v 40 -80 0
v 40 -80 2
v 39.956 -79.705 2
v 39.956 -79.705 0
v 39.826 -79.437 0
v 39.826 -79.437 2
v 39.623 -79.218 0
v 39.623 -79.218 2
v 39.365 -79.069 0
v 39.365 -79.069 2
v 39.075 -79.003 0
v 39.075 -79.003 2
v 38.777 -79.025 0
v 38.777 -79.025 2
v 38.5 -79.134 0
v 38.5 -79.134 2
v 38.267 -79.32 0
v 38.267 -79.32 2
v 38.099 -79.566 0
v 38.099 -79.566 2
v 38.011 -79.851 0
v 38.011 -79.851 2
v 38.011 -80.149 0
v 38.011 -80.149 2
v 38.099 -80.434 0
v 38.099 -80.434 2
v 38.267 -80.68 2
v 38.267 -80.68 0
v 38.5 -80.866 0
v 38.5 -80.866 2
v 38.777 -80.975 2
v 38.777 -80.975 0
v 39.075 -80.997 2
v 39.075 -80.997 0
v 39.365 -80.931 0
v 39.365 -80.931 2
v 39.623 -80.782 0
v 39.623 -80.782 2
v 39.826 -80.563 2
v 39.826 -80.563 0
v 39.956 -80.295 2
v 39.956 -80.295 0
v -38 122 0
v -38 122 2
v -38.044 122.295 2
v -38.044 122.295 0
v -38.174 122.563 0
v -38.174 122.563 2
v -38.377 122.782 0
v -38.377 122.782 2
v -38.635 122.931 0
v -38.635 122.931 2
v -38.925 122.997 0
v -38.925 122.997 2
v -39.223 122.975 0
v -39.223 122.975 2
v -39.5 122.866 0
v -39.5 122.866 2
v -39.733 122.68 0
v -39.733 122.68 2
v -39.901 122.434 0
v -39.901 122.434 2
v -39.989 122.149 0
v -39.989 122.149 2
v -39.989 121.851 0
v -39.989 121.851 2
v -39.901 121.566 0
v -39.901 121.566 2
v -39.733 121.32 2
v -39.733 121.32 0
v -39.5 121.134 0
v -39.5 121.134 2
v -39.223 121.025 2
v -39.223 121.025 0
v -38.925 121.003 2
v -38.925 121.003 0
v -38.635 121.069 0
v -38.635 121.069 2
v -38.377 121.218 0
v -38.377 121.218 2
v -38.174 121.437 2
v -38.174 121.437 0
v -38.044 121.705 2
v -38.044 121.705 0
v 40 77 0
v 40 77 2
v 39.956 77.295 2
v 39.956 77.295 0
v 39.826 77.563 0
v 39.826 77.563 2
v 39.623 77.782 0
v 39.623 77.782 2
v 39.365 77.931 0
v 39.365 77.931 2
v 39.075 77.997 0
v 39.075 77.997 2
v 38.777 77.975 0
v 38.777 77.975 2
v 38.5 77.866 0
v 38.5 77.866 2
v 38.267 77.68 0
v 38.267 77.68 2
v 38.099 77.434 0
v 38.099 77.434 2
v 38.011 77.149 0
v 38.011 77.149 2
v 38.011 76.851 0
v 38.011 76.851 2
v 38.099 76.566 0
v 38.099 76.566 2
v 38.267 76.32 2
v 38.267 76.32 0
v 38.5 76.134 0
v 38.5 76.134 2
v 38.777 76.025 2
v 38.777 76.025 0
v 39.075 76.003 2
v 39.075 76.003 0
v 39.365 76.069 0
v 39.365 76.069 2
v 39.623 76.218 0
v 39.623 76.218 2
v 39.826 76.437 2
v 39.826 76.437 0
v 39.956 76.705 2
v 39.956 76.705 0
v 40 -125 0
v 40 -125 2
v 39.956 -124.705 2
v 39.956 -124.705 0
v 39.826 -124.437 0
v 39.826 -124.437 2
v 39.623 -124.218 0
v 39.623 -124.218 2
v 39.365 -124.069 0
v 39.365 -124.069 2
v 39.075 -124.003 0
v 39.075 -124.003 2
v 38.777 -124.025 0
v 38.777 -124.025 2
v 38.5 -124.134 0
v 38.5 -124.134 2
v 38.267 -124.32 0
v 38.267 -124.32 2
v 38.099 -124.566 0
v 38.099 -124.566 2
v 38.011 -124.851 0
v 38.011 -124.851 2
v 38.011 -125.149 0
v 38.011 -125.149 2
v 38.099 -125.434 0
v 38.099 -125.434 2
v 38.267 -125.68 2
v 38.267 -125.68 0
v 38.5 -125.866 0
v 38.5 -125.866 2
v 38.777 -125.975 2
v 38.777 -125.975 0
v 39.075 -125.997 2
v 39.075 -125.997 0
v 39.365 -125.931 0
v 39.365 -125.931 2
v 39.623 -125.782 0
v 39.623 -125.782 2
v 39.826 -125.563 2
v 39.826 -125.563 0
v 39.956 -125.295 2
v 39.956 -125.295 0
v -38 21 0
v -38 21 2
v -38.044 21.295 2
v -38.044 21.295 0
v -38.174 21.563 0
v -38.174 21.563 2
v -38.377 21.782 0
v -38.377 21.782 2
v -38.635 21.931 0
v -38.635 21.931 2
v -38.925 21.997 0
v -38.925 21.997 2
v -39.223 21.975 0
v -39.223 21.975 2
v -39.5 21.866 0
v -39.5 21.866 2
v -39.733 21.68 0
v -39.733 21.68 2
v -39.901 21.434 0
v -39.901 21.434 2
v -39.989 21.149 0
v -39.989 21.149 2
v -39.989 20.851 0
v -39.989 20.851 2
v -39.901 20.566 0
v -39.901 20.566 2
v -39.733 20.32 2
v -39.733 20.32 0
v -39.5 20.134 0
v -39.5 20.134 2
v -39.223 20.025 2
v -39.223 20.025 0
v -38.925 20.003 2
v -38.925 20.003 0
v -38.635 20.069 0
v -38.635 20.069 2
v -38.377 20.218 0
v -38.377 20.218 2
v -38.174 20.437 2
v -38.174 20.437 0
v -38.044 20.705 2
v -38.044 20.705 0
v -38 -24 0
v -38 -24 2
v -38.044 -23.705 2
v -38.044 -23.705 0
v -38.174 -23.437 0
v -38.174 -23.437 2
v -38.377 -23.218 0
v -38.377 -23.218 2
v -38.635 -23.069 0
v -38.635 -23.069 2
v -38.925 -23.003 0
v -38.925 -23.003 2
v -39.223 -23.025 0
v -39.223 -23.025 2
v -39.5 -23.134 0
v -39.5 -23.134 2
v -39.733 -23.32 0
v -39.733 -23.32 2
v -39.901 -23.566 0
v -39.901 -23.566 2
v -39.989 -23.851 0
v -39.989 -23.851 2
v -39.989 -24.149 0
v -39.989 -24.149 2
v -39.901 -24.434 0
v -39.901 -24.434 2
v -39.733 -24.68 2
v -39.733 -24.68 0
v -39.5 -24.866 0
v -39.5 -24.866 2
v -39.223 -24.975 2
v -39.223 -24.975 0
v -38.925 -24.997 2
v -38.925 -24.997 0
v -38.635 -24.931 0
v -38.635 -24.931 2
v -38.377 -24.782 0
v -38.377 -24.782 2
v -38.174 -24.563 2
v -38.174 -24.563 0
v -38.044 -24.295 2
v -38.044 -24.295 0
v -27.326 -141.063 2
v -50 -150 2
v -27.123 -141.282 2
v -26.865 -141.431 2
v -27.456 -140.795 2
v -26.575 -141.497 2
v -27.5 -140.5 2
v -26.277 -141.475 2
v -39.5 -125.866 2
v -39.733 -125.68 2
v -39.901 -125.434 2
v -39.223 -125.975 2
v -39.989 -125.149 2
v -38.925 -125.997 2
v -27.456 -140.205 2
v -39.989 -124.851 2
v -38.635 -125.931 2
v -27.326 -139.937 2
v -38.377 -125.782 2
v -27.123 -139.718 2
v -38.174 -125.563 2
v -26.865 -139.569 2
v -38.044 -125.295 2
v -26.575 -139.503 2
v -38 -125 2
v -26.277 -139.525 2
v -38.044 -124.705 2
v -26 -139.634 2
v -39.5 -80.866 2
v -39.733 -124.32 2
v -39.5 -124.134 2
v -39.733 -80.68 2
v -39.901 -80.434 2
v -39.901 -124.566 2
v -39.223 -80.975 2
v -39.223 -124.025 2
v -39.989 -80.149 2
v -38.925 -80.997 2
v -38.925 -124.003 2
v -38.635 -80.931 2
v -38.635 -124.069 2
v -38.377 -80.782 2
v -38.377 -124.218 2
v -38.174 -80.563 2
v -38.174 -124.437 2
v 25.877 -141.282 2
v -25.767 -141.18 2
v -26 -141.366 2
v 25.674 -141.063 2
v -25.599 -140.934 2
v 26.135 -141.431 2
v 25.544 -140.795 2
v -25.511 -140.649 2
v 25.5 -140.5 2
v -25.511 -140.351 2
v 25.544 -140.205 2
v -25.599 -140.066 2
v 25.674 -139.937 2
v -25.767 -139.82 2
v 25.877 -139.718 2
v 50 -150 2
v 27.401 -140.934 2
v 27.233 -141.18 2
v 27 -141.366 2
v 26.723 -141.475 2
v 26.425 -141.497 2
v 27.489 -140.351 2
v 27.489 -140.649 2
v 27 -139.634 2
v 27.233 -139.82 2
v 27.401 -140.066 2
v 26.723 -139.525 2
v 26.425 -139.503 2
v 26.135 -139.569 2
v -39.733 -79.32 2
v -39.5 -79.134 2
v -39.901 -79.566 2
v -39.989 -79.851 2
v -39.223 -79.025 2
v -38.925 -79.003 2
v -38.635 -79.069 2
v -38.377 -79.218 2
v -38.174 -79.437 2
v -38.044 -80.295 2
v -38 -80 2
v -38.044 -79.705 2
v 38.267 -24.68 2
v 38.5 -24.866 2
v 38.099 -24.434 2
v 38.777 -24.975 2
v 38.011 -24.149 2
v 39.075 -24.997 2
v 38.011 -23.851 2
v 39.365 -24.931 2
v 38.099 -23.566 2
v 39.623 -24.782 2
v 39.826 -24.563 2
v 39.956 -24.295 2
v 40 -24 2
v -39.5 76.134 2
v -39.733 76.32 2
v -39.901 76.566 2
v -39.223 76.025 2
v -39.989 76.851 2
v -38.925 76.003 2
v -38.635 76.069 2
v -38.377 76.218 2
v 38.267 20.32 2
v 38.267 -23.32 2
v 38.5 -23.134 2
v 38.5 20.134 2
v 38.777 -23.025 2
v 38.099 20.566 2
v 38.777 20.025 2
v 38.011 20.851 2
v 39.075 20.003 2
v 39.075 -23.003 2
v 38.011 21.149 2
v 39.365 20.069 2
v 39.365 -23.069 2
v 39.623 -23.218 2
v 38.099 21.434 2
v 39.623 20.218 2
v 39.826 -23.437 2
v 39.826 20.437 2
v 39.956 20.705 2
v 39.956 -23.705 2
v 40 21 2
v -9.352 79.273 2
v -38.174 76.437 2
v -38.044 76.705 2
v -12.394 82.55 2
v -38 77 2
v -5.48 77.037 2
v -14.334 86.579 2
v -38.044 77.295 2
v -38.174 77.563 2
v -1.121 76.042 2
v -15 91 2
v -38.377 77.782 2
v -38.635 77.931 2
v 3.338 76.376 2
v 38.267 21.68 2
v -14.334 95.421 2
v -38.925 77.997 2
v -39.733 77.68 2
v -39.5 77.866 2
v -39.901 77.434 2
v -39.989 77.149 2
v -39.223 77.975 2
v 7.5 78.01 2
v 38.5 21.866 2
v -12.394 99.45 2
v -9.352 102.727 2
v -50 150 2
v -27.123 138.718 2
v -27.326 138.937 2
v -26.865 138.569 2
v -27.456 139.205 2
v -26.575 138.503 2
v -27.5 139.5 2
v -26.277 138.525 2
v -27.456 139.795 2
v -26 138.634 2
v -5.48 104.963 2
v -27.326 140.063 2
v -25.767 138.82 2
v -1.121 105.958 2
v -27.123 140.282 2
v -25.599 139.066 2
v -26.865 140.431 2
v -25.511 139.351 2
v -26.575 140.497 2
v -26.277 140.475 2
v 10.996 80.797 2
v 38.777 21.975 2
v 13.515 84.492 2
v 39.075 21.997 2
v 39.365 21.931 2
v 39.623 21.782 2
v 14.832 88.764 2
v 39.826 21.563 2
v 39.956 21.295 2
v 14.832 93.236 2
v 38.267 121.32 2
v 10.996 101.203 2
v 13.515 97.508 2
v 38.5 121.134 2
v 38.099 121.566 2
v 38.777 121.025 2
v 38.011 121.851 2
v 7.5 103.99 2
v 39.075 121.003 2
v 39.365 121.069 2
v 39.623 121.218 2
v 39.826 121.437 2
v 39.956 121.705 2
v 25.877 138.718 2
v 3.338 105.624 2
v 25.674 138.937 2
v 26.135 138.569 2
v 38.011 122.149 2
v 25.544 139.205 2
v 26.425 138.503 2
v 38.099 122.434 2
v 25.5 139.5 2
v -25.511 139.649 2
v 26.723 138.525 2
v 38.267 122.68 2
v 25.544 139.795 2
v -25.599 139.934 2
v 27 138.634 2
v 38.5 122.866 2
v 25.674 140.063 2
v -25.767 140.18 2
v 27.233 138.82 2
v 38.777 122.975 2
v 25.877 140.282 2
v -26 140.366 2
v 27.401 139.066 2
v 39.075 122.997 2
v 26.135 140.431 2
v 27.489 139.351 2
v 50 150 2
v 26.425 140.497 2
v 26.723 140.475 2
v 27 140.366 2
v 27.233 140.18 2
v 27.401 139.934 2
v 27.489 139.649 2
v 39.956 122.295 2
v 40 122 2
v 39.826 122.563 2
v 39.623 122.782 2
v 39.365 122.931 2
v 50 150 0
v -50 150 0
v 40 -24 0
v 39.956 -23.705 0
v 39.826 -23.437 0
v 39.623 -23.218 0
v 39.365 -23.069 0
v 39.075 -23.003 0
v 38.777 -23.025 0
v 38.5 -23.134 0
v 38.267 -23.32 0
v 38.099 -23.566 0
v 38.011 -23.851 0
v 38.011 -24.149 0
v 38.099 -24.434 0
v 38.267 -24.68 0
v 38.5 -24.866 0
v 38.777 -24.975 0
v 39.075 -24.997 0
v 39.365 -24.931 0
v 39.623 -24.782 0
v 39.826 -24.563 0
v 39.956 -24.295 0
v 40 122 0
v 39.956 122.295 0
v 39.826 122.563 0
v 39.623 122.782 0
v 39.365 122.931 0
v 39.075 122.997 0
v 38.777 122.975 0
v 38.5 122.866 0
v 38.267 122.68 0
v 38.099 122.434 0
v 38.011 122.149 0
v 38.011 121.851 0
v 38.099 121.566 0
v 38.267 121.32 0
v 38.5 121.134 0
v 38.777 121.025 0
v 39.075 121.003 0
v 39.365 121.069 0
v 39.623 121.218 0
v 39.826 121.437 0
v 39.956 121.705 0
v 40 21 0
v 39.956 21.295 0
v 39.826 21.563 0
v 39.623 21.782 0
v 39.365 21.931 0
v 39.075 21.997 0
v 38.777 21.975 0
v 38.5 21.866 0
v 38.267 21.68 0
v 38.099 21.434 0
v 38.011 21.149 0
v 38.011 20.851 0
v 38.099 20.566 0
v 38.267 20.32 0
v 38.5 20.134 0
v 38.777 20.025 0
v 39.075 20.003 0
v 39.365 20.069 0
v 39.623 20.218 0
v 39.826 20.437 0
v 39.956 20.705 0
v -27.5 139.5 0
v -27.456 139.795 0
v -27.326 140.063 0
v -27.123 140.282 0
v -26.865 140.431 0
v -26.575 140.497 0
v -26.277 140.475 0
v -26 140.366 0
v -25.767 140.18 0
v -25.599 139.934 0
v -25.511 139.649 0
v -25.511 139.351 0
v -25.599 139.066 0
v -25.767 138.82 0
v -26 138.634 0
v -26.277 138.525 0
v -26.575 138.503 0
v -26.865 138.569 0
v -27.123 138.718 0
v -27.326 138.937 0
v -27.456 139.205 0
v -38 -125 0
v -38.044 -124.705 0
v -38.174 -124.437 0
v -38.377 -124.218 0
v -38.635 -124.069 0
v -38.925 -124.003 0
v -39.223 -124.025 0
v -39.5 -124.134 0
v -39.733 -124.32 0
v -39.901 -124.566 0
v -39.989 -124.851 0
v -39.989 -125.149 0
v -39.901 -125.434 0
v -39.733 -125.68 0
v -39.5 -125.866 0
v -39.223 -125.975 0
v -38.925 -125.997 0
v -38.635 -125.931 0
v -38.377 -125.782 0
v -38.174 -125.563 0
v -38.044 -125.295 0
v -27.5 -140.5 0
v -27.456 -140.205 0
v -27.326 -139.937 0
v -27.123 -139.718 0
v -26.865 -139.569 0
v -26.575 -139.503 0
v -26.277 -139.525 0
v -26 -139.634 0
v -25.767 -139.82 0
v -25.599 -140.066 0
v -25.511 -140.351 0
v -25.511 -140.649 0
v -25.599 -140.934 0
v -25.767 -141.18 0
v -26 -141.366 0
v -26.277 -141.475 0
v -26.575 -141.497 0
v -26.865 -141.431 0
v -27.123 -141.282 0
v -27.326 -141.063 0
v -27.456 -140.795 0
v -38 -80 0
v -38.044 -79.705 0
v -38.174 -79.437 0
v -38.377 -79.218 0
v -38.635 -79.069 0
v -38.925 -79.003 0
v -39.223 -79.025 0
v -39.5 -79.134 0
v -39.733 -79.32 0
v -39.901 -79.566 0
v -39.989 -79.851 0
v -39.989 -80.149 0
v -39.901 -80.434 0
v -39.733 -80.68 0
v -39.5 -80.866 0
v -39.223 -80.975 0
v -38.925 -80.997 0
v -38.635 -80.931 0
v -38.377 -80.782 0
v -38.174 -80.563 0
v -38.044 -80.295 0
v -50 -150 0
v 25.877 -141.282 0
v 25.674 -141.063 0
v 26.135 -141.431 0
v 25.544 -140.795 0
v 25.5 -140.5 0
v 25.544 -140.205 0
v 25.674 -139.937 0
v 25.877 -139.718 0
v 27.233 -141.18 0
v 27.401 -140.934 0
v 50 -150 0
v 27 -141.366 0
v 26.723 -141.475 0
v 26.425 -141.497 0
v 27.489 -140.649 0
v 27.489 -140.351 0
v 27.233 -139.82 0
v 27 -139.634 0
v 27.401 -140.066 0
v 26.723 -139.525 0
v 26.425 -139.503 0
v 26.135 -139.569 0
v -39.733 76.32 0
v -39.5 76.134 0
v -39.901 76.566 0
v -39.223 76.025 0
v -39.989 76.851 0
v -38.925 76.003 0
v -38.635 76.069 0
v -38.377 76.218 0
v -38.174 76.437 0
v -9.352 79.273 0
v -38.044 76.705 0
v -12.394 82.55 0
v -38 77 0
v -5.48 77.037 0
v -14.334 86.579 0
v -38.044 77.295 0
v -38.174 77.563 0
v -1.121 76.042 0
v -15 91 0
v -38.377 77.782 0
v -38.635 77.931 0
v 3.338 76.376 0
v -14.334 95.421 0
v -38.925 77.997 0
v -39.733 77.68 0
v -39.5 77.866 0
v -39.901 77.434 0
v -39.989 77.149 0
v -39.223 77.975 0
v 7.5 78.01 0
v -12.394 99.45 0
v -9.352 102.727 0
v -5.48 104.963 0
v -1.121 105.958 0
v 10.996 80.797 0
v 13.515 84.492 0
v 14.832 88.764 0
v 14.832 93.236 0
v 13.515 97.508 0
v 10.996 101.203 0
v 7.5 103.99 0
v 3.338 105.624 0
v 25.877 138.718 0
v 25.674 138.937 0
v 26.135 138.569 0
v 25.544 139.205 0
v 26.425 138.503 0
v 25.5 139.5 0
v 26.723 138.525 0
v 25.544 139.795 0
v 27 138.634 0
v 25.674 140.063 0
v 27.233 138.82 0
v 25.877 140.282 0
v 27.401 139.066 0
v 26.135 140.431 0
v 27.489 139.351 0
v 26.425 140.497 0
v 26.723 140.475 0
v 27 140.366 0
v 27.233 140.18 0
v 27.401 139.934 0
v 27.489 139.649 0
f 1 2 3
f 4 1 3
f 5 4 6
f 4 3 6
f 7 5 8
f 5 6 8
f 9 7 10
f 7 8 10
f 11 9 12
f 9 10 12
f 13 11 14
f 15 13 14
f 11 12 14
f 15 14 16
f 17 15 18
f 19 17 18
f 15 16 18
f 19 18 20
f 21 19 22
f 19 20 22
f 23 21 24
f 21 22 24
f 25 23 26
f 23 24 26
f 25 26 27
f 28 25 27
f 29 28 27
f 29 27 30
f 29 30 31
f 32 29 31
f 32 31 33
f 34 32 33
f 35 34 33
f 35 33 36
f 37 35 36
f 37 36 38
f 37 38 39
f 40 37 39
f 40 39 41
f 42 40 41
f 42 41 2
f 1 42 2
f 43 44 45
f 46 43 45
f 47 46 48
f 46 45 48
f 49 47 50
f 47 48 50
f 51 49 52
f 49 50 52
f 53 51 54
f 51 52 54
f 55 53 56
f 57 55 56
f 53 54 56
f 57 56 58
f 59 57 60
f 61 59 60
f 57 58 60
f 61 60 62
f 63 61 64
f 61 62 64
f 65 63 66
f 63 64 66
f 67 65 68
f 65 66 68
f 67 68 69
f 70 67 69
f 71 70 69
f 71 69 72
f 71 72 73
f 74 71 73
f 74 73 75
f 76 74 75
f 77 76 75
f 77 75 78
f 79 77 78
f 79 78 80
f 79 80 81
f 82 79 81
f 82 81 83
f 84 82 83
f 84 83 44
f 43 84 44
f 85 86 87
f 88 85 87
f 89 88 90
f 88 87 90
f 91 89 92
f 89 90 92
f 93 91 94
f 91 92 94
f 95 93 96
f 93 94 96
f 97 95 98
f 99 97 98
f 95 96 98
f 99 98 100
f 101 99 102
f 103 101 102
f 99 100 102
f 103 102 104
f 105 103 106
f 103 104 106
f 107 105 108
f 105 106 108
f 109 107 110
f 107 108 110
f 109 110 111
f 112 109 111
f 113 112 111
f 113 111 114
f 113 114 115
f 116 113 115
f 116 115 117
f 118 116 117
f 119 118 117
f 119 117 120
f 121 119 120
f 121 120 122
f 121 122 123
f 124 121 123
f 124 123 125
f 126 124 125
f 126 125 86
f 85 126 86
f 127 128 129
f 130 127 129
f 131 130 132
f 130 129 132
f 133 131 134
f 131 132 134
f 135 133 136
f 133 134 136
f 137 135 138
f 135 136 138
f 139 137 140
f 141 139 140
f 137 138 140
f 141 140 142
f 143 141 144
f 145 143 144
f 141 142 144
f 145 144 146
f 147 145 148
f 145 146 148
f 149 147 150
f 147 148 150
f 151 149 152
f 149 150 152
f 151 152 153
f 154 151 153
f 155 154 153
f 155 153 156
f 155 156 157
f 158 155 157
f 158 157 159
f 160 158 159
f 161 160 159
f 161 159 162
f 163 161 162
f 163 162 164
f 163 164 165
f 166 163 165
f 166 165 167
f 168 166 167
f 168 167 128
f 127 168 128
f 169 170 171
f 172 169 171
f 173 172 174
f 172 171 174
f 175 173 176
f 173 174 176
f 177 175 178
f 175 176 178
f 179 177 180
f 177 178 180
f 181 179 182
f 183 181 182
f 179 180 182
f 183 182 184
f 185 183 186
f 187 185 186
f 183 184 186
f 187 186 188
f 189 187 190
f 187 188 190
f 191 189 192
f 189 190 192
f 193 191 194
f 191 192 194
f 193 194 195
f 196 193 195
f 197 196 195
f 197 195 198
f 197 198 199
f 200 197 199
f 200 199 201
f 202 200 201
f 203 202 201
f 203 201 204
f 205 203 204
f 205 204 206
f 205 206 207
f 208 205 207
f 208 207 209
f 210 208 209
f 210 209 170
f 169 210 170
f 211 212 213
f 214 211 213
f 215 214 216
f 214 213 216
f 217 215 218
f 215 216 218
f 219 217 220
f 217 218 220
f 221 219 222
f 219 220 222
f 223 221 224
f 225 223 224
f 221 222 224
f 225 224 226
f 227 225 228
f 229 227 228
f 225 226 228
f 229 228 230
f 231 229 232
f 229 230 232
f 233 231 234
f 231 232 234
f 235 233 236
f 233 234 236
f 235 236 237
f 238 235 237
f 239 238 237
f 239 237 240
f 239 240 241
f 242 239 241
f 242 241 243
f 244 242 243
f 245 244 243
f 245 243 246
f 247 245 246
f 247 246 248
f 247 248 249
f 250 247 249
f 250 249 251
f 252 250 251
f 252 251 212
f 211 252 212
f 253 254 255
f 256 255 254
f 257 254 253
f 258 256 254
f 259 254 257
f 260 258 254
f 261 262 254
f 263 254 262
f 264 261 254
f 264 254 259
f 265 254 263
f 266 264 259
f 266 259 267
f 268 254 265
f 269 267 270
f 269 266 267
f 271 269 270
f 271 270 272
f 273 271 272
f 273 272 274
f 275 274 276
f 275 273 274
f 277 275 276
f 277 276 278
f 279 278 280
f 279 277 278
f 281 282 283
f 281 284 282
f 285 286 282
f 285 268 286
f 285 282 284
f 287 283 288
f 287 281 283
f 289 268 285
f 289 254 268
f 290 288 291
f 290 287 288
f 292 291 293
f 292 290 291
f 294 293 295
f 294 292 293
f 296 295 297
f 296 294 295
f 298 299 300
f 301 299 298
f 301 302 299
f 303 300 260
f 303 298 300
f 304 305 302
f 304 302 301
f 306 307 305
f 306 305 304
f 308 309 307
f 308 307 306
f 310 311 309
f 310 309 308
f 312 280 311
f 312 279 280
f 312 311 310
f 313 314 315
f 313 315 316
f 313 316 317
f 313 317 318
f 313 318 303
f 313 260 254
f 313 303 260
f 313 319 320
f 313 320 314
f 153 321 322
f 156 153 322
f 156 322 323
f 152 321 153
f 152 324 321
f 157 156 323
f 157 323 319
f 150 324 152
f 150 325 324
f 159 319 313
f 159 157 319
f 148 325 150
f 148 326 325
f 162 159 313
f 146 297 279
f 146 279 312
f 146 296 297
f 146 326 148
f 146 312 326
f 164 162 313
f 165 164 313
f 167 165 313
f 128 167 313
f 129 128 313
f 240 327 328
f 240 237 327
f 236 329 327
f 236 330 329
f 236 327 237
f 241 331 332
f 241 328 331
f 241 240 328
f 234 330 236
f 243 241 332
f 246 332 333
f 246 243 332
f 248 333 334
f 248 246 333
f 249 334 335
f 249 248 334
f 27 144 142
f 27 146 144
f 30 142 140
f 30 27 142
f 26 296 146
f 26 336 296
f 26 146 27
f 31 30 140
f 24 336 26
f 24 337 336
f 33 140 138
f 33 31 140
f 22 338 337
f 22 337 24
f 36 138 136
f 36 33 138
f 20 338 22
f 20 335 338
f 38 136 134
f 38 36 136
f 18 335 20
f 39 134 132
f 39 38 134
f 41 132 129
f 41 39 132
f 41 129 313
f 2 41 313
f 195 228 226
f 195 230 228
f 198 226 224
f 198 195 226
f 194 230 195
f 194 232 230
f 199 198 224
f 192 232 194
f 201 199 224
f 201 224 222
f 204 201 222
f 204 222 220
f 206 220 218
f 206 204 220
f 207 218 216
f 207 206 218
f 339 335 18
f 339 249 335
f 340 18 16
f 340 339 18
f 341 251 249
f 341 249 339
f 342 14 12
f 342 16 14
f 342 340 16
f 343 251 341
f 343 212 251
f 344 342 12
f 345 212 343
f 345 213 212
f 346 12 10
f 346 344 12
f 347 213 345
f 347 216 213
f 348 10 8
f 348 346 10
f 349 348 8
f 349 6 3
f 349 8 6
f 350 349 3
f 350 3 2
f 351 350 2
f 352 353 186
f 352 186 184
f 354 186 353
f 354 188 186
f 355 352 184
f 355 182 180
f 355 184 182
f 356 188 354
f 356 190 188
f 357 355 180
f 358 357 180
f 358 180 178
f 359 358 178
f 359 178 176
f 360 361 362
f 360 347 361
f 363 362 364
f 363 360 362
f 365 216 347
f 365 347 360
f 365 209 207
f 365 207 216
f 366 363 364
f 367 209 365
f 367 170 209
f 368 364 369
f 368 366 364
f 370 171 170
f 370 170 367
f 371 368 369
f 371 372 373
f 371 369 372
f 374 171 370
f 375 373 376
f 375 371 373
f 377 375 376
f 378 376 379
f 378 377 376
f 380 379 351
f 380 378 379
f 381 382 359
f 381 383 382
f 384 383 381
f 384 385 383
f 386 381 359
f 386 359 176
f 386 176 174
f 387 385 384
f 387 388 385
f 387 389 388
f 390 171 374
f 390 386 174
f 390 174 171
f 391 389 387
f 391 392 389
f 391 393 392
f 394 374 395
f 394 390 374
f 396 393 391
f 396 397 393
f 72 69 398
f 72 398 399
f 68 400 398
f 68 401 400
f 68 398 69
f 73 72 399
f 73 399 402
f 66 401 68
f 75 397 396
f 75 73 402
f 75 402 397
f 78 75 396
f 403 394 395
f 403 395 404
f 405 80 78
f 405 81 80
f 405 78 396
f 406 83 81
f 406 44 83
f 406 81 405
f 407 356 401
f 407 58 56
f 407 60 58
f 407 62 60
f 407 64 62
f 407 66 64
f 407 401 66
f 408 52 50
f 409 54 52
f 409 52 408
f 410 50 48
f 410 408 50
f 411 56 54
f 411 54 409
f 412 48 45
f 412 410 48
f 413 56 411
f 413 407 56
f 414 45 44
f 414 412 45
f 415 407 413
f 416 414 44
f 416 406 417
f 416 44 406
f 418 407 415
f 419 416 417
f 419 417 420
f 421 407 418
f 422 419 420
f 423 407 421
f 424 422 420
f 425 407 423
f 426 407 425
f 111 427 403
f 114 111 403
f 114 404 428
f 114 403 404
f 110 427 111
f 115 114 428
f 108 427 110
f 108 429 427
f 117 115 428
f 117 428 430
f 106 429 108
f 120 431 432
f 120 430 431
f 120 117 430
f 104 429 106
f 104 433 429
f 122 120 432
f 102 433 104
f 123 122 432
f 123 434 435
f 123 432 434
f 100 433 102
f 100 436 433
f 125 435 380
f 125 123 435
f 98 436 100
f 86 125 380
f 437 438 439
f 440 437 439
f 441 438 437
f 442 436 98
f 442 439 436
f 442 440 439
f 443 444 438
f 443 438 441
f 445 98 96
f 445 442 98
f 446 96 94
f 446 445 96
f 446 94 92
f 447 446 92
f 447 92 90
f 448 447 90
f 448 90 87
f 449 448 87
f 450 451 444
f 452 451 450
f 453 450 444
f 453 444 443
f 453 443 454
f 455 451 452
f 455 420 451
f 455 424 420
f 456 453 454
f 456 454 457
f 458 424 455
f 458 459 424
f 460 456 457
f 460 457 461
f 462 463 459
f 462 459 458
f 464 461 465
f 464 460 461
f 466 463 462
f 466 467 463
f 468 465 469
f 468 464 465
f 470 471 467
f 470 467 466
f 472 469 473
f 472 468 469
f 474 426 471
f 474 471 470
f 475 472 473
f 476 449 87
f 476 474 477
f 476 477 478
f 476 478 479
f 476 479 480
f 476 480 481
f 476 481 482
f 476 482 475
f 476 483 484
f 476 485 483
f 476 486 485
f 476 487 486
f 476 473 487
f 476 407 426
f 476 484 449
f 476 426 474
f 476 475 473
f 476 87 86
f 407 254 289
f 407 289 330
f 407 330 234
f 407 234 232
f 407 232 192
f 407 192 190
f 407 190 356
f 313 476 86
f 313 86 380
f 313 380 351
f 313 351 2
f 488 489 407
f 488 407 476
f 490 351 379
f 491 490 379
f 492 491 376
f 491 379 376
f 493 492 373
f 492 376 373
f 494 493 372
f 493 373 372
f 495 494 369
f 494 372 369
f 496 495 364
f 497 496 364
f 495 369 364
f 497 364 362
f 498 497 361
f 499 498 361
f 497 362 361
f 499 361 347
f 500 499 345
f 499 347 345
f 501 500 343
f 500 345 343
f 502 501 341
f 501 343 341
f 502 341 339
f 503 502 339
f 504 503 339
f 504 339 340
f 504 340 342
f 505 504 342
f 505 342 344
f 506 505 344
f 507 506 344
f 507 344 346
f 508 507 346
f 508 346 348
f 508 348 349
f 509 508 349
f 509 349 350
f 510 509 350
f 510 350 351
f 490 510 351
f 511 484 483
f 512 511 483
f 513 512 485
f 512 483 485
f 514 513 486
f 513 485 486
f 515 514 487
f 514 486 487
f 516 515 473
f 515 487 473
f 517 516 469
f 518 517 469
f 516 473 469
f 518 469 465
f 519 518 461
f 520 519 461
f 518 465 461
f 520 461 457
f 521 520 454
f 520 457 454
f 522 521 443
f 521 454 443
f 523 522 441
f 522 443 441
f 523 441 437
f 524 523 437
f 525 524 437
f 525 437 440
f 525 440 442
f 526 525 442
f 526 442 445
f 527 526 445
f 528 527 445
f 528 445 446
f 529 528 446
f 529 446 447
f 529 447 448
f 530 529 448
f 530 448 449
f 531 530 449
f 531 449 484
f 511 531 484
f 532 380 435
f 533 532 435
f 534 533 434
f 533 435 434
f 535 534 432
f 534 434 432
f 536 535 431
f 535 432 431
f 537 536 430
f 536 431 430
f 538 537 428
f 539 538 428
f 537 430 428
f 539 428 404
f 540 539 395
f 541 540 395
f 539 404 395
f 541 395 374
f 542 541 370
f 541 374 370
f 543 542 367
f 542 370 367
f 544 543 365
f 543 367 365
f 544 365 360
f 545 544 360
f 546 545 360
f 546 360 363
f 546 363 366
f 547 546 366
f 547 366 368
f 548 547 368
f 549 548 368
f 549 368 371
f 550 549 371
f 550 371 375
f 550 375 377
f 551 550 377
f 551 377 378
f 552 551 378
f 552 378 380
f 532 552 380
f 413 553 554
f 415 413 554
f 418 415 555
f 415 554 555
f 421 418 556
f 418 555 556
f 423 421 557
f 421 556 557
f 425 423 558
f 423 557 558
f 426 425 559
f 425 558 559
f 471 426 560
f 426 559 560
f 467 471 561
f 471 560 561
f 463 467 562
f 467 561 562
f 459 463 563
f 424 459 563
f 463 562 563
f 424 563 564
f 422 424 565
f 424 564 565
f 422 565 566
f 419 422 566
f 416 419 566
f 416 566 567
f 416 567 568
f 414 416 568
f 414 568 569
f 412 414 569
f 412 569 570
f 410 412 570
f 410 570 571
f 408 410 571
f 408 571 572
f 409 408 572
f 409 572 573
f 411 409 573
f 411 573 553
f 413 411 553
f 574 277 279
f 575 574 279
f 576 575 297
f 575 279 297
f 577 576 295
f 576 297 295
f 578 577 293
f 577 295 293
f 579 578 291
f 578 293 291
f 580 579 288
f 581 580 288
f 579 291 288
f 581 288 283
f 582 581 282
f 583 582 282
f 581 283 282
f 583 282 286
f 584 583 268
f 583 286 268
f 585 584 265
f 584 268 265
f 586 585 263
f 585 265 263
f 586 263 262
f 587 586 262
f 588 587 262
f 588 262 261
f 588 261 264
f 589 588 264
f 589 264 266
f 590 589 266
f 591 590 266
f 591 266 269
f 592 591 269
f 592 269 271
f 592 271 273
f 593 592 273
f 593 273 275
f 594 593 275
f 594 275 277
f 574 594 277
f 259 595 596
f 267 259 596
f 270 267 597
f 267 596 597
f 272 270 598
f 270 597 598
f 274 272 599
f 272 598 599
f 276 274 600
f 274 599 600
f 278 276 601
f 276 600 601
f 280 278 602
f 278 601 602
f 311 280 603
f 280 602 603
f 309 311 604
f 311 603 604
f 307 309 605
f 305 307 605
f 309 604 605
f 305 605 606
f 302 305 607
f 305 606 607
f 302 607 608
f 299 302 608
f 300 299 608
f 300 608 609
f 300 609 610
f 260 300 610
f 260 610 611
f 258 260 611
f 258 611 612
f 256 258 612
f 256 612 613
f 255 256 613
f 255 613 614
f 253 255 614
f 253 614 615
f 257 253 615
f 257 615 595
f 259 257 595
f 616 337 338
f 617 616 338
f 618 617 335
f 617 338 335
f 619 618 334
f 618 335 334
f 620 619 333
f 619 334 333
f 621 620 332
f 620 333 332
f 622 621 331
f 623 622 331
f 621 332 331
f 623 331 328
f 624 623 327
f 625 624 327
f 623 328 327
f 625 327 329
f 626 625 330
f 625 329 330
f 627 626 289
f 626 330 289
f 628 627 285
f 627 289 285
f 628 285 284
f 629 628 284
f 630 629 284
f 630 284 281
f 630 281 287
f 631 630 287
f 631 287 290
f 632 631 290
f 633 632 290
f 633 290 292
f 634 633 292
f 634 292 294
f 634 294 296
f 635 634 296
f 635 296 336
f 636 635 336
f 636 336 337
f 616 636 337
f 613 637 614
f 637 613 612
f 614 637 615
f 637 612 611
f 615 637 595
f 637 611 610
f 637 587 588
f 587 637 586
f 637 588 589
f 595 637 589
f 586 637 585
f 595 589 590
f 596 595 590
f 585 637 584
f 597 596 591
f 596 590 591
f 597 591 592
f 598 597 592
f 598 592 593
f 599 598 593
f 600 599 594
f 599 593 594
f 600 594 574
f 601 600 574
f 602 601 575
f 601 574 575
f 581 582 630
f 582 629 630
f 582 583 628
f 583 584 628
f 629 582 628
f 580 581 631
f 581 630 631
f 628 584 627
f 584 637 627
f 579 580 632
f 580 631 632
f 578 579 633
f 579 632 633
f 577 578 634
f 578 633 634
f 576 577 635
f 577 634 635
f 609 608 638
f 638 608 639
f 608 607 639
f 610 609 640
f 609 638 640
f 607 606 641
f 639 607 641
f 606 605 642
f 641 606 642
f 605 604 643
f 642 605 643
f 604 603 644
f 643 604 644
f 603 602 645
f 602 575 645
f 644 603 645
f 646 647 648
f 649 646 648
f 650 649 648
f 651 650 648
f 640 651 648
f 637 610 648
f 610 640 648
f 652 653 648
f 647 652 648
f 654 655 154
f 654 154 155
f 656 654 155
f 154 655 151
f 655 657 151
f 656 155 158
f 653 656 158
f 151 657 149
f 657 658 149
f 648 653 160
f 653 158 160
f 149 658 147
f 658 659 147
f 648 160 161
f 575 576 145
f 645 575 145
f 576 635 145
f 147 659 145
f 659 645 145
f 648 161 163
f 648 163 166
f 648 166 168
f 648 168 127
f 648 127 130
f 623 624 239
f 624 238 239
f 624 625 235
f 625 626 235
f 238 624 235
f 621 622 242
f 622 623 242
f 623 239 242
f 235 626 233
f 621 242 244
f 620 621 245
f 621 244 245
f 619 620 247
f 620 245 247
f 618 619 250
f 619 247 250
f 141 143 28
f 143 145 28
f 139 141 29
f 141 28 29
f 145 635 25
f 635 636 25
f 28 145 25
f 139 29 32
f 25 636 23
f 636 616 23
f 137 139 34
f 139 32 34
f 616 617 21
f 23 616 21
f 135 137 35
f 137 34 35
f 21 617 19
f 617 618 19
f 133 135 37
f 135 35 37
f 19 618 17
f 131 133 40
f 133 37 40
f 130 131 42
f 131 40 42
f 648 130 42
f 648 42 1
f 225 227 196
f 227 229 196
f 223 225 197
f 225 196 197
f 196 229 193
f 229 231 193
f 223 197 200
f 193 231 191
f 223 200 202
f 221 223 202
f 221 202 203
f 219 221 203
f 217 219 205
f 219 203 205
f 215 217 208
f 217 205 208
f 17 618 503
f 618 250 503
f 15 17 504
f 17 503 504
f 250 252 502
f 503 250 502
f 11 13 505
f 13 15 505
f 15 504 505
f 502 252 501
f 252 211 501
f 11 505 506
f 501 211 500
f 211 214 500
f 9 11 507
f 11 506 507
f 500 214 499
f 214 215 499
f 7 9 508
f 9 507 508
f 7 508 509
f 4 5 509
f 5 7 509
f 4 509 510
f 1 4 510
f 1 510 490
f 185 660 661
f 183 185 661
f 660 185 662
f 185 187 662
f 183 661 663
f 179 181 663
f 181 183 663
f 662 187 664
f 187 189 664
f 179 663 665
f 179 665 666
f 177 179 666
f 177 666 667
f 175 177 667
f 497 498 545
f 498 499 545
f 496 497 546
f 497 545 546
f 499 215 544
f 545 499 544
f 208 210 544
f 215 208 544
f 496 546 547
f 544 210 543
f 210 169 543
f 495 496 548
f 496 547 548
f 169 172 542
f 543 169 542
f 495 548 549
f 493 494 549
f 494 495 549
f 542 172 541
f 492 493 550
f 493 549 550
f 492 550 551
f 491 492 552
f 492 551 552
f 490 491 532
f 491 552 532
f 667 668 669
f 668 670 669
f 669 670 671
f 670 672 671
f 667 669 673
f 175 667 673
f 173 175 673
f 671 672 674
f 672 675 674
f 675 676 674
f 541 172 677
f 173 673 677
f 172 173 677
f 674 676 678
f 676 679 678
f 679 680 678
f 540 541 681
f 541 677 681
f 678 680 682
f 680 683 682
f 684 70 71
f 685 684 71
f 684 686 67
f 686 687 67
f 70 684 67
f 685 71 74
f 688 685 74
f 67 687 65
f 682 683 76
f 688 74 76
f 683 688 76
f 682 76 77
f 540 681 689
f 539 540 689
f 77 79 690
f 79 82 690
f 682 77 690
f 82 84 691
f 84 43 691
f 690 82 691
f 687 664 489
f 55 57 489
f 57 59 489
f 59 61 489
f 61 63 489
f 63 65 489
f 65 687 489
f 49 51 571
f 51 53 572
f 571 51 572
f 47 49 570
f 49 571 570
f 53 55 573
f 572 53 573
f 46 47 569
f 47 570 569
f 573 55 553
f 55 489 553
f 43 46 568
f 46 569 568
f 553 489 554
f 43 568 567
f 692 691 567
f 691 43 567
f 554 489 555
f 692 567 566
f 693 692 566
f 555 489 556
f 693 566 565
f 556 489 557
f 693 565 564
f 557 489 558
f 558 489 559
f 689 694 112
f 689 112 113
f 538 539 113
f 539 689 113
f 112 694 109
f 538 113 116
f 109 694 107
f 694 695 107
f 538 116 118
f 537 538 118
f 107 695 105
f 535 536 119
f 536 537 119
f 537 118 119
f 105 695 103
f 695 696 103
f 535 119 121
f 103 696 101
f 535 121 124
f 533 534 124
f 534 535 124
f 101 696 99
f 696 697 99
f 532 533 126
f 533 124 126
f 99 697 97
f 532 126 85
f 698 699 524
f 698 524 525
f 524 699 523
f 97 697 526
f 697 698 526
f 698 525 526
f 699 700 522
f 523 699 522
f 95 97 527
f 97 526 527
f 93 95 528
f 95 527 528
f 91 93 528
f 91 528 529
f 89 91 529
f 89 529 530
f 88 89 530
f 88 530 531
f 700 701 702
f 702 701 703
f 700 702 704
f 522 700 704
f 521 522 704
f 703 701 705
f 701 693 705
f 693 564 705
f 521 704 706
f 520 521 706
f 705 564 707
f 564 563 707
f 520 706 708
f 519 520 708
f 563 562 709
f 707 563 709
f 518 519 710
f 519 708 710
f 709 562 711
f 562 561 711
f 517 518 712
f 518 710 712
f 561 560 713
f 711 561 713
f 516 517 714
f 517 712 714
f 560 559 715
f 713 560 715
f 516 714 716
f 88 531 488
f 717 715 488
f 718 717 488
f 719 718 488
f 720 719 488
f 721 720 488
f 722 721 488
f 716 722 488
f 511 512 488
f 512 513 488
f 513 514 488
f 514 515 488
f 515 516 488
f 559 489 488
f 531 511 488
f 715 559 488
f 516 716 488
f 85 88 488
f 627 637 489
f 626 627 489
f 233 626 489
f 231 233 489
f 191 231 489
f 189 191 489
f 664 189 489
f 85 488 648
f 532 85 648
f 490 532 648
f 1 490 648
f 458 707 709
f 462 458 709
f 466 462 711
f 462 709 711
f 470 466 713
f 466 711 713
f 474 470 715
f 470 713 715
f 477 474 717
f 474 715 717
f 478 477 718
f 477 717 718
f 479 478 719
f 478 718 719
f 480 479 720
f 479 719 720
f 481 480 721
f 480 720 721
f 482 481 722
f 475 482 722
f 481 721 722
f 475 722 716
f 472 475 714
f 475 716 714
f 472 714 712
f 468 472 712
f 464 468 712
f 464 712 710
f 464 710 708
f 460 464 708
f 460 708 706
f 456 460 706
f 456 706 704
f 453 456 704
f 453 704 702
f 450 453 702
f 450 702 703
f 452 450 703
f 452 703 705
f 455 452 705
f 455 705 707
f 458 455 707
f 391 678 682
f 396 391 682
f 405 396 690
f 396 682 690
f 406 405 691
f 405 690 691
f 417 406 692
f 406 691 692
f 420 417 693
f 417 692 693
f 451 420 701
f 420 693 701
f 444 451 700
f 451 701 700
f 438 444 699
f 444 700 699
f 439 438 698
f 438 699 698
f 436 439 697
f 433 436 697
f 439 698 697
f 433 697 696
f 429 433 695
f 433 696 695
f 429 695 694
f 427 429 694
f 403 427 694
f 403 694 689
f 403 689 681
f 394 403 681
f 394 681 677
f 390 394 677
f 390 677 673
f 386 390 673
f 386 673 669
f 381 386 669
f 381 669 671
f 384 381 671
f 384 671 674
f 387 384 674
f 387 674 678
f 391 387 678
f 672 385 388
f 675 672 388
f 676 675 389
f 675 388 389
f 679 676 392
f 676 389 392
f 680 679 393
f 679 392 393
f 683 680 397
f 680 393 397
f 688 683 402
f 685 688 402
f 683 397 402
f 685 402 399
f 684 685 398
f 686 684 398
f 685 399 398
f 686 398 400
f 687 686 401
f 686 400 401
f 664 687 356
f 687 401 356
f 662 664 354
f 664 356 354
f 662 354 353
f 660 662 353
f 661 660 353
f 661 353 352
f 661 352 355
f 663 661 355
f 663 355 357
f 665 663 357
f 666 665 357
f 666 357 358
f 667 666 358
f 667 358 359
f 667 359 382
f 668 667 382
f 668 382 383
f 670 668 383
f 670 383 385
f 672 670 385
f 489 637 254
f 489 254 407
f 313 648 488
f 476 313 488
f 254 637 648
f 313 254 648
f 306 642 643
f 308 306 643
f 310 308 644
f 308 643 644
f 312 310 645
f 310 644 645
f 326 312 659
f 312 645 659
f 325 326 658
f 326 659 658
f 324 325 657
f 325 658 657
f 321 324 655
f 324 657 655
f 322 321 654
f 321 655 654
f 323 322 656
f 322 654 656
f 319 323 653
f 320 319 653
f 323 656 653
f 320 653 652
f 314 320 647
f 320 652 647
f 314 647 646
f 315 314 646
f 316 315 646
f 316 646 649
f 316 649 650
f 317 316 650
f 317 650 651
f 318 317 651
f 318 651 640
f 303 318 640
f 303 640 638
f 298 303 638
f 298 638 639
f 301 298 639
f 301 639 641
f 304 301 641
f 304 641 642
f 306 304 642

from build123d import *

# Parameters (mm, degrees)
SKETCH1_W           = 100
SKETCH1_H           = 300
BOSS_EXTRUDE1_DEPTH = 2
SKETCH2_R           = 1
CUT_EXTRUDE1_DEPTH  = 10
SKETCH3_R           = 15
CUT_EXTRUDE2_DEPTH  = 10
SKETCH4_R           = 1
CUT_EXTRUDE3_DEPTH  = 10


with BuildPart() as part:
    # Sketch1 → Boss-Extrude1 (new body)
    with BuildSketch(Plane.XY):
        Rectangle(SKETCH1_W, SKETCH1_H)
    extrude(amount=BOSS_EXTRUDE1_DEPTH)

    # Sketch2 → Cut-Extrude1 (cut)
    with BuildSketch(Plane.XY.offset(2)):
        with Locations((-39, 122)):
            Circle(SKETCH2_R)
        with Locations((-39, 77)):
            Circle(SKETCH2_R)
        with Locations((39, 122)):
            Circle(SKETCH2_R)
        with Locations((39, 77)):
            Circle(SKETCH2_R)
        with Locations((-39, 21)):
            Circle(SKETCH2_R)
        with Locations((-39, -24)):
            Circle(SKETCH2_R)
        with Locations((39, 21)):
            Circle(SKETCH2_R)
        with Locations((39, -24)):
            Circle(SKETCH2_R)
        with Locations((-39, -80)):
            Circle(SKETCH2_R)
        with Locations((-39, -125)):
            Circle(SKETCH2_R)
        with Locations((39, -80)):
            Circle(SKETCH2_R)
        with Locations((39, -125)):
            Circle(SKETCH2_R)
    extrude(amount=-CUT_EXTRUDE1_DEPTH, mode=Mode.SUBTRACT)

    # Sketch3 → Cut-Extrude2 (cut)
    with BuildSketch(Plane(origin=(0, 0, 0), x_dir=(-1, 0, 0), z_dir=(0, 0, -1))):
        with Locations((0, 91)):
            Circle(SKETCH3_R)
    extrude(amount=-CUT_EXTRUDE2_DEPTH, mode=Mode.SUBTRACT)

    # Sketch4 → Cut-Extrude3 (cut)
    with BuildSketch(Plane(origin=(0, 0, 0), x_dir=(-1, 0, 0), z_dir=(0, 0, -1))):
        with Locations((-26.5, 139.5)):
            Circle(SKETCH4_R)
        with Locations((26.5, 139.5)):
            Circle(SKETCH4_R)
        with Locations((-26.5, -140.5)):
            Circle(SKETCH4_R)
        with Locations((26.5, -140.5)):
            Circle(SKETCH4_R)
    extrude(amount=-CUT_EXTRUDE3_DEPTH, mode=Mode.SUBTRACT)


solid = part.part
